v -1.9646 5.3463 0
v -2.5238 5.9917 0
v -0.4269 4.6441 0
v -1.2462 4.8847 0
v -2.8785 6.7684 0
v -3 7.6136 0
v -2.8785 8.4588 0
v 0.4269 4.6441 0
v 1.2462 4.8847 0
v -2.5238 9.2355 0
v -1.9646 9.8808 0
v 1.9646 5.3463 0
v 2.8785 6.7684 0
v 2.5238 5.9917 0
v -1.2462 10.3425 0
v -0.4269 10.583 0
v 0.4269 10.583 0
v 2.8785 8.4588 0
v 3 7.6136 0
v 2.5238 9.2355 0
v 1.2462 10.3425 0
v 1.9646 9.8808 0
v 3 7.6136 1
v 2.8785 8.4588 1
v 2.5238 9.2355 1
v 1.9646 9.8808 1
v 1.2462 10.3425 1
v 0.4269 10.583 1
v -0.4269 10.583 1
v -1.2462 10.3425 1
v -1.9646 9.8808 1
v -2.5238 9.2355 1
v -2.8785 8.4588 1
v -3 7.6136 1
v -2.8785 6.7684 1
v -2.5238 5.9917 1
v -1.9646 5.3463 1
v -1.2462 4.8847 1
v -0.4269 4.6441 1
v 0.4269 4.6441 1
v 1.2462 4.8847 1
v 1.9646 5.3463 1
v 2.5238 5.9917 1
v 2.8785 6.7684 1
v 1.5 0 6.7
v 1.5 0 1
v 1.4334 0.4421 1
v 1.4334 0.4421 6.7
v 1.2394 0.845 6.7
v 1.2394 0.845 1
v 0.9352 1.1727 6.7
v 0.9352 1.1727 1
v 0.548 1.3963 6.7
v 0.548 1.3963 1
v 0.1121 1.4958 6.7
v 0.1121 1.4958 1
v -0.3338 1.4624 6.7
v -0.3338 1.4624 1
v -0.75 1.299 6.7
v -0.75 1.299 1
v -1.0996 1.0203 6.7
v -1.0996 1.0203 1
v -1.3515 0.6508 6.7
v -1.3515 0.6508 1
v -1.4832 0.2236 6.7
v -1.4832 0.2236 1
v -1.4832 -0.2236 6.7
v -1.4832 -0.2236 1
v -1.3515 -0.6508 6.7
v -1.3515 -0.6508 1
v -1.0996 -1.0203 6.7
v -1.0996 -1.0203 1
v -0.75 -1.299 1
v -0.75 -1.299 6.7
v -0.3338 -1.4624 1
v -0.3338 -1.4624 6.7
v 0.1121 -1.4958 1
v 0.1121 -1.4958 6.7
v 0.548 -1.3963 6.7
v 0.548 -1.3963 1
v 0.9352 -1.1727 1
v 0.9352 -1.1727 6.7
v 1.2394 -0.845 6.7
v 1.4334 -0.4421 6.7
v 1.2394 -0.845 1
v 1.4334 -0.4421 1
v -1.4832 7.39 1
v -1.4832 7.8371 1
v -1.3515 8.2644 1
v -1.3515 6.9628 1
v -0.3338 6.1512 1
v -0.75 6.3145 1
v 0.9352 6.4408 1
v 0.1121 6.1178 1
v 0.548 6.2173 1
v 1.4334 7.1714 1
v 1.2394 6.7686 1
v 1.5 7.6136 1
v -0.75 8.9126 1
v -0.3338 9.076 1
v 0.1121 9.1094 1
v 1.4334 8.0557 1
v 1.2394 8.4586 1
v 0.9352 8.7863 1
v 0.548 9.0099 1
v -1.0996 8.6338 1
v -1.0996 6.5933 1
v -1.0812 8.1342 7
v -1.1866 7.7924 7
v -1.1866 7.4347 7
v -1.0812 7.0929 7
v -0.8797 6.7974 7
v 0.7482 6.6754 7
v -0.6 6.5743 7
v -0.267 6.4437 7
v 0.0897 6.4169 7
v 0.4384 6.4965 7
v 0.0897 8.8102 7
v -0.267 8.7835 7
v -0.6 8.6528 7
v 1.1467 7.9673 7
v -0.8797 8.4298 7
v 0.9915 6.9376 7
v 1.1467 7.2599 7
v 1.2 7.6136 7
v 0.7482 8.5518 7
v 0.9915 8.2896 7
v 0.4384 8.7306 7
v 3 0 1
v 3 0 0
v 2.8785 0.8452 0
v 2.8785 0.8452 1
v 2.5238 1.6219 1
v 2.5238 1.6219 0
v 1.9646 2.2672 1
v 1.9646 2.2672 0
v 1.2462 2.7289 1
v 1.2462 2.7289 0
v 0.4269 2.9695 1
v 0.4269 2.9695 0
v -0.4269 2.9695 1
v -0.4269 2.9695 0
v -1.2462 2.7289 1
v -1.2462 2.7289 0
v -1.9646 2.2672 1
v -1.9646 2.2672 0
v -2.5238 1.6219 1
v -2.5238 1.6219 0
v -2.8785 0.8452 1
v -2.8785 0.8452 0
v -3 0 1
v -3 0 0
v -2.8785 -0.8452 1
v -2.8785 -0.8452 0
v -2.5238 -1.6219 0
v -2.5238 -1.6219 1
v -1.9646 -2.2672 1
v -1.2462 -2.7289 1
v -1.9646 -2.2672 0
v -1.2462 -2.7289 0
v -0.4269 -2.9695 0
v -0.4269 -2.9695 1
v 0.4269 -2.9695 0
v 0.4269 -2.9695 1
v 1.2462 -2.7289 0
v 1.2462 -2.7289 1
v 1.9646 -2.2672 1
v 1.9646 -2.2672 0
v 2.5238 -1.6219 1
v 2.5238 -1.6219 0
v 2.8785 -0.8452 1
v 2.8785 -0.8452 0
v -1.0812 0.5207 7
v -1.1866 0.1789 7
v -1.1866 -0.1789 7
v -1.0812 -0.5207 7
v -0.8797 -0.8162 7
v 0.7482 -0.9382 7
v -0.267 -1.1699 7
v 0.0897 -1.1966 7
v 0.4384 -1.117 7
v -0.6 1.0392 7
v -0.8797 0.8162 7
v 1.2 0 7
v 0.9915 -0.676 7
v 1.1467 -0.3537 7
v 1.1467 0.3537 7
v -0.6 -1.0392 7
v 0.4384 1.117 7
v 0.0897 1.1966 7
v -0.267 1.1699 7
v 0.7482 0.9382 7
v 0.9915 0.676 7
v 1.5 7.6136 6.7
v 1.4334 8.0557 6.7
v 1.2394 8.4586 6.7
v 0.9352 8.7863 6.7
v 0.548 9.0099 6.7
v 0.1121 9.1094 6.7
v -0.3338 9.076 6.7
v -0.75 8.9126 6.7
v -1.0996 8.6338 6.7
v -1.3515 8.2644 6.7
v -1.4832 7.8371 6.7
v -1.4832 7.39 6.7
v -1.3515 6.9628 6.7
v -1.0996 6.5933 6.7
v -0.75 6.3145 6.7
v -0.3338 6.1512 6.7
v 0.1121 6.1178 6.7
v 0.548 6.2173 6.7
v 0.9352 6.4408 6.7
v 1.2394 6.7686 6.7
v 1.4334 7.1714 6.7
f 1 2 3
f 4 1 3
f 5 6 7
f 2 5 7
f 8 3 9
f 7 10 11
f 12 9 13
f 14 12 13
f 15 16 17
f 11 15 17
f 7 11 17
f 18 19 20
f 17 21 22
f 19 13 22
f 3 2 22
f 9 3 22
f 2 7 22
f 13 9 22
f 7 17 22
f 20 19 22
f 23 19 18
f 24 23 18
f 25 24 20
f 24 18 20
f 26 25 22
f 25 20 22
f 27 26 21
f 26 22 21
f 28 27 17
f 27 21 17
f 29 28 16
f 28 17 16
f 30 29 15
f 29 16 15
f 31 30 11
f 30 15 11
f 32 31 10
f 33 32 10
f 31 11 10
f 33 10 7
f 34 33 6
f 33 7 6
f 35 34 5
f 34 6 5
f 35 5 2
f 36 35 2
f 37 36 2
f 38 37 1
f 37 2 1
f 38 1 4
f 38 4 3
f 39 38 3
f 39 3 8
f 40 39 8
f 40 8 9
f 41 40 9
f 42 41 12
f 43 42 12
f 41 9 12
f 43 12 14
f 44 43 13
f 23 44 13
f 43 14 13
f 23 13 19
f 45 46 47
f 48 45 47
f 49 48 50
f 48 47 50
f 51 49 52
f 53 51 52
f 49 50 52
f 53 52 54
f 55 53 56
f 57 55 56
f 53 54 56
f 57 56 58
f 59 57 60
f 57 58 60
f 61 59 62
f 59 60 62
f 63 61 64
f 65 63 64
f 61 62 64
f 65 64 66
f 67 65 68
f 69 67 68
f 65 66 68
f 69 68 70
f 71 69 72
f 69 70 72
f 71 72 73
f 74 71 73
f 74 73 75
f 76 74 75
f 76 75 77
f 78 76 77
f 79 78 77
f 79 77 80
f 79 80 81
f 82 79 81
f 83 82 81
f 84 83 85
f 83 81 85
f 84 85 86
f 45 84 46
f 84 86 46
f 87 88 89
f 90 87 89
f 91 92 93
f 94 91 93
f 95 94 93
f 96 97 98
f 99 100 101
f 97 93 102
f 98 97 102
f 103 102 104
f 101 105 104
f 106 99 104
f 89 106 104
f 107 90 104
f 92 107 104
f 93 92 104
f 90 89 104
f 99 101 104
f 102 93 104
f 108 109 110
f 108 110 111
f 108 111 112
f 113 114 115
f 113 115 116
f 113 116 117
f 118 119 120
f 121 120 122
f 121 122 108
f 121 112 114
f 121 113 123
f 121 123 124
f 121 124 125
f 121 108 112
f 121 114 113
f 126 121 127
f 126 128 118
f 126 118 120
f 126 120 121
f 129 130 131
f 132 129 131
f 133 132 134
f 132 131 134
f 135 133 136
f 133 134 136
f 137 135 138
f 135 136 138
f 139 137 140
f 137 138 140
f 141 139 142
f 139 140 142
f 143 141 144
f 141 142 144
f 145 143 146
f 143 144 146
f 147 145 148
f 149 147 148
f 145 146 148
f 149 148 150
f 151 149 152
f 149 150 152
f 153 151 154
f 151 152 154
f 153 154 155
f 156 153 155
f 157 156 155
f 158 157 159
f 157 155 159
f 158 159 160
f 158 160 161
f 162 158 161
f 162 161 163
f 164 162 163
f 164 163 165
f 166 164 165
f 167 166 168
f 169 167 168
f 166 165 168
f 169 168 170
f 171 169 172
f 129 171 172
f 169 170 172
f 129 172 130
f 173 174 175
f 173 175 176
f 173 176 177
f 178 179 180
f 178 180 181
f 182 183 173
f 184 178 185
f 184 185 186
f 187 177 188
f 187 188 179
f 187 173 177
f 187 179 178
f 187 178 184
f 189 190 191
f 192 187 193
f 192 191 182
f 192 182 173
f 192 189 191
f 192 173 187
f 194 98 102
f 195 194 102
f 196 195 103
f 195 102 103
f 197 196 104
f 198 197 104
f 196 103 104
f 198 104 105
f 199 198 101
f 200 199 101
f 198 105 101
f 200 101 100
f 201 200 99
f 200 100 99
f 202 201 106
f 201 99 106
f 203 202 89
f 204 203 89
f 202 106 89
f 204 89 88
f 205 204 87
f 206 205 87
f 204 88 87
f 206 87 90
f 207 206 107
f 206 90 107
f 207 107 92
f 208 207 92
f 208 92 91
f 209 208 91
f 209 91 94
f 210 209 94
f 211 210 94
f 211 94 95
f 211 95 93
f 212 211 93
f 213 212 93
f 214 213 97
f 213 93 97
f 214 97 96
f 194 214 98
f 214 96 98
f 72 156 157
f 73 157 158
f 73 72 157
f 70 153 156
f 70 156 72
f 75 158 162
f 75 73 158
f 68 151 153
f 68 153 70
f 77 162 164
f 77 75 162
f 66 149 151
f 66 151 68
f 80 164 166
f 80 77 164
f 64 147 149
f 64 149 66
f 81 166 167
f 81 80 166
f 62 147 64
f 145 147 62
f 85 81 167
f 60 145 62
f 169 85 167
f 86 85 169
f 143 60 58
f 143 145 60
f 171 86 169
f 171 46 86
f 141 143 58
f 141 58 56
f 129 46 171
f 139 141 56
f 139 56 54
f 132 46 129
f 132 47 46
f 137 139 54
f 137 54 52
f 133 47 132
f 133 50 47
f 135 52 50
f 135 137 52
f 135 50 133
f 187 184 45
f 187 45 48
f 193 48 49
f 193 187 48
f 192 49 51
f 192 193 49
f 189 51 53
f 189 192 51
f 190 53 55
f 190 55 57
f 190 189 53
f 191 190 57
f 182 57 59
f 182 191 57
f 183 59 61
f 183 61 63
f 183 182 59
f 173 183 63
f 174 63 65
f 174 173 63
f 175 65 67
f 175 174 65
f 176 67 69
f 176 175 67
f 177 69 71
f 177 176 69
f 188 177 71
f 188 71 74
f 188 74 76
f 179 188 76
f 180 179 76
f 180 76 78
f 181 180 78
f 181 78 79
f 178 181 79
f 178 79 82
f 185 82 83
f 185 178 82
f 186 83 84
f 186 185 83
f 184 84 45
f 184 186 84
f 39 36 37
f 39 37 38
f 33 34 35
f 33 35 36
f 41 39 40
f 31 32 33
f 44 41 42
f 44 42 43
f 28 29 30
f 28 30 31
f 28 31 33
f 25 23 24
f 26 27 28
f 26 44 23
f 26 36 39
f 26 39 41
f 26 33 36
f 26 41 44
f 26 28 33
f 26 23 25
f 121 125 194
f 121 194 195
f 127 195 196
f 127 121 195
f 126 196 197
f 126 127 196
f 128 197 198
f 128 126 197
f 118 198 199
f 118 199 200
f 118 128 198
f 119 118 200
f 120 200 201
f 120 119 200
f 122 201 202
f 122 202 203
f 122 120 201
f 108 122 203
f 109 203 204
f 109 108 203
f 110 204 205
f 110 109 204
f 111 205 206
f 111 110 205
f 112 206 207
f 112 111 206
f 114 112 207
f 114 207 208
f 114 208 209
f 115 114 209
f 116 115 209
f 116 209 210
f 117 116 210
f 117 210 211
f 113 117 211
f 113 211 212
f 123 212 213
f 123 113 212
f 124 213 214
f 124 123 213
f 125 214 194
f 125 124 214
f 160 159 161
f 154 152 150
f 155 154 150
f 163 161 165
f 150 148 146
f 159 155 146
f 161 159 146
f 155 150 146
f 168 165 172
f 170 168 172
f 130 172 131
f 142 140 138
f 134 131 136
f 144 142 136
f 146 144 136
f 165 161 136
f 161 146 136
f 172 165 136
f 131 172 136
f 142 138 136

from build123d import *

# Parameters (mm, degrees)
F0_R      = 3
F1_DEPTH  = 1
F2_R      = 1.5
F3_DEPTH  = 6
F4_SIZE   = 0.3
F4_2_SIZE = 0.3


with BuildPart() as f1:
    # F0 (on Top) → F1 (new body)
    with BuildSketch(Plane.XY):
        Circle(F0_R)
    extrude(amount=F1_DEPTH)

    # F2 (on face) → F3 (join)
    with BuildSketch(Plane.XY.offset(1)):
        Circle(F2_R)
    extrude(amount=F3_DEPTH)

    # F4
    f4_edges = [f1.edges().sort_by_distance(p)[0] for p in [
        (-1.5, 0, 7),
    ]]
    chamfer(f4_edges, length=F4_SIZE)


with BuildPart() as f1b:
    # F0 (on Top) → F1, piece 2 (new body)
    with BuildSketch(Plane.XY):
        with Locations((0, 7.61357788)):
            Circle(F0_R)
    extrude(amount=F1_DEPTH)


with BuildPart() as f3:
    # F2 (on face) → F3, piece 2 (new body)
    with BuildSketch(Plane.XY.offset(1)):
        with Locations((0, 7.61357788)):
            Circle(F2_R)
    extrude(amount=F3_DEPTH)

    # F4#2
    f4_2_edges = [f3.edges().sort_by_distance(p)[0] for p in [
        (-1.5, 7.613578, 7),
    ]]
    chamfer(f4_2_edges, length=F4_2_SIZE)


solid = Compound([f1.part, f1b.part, f3.part])
